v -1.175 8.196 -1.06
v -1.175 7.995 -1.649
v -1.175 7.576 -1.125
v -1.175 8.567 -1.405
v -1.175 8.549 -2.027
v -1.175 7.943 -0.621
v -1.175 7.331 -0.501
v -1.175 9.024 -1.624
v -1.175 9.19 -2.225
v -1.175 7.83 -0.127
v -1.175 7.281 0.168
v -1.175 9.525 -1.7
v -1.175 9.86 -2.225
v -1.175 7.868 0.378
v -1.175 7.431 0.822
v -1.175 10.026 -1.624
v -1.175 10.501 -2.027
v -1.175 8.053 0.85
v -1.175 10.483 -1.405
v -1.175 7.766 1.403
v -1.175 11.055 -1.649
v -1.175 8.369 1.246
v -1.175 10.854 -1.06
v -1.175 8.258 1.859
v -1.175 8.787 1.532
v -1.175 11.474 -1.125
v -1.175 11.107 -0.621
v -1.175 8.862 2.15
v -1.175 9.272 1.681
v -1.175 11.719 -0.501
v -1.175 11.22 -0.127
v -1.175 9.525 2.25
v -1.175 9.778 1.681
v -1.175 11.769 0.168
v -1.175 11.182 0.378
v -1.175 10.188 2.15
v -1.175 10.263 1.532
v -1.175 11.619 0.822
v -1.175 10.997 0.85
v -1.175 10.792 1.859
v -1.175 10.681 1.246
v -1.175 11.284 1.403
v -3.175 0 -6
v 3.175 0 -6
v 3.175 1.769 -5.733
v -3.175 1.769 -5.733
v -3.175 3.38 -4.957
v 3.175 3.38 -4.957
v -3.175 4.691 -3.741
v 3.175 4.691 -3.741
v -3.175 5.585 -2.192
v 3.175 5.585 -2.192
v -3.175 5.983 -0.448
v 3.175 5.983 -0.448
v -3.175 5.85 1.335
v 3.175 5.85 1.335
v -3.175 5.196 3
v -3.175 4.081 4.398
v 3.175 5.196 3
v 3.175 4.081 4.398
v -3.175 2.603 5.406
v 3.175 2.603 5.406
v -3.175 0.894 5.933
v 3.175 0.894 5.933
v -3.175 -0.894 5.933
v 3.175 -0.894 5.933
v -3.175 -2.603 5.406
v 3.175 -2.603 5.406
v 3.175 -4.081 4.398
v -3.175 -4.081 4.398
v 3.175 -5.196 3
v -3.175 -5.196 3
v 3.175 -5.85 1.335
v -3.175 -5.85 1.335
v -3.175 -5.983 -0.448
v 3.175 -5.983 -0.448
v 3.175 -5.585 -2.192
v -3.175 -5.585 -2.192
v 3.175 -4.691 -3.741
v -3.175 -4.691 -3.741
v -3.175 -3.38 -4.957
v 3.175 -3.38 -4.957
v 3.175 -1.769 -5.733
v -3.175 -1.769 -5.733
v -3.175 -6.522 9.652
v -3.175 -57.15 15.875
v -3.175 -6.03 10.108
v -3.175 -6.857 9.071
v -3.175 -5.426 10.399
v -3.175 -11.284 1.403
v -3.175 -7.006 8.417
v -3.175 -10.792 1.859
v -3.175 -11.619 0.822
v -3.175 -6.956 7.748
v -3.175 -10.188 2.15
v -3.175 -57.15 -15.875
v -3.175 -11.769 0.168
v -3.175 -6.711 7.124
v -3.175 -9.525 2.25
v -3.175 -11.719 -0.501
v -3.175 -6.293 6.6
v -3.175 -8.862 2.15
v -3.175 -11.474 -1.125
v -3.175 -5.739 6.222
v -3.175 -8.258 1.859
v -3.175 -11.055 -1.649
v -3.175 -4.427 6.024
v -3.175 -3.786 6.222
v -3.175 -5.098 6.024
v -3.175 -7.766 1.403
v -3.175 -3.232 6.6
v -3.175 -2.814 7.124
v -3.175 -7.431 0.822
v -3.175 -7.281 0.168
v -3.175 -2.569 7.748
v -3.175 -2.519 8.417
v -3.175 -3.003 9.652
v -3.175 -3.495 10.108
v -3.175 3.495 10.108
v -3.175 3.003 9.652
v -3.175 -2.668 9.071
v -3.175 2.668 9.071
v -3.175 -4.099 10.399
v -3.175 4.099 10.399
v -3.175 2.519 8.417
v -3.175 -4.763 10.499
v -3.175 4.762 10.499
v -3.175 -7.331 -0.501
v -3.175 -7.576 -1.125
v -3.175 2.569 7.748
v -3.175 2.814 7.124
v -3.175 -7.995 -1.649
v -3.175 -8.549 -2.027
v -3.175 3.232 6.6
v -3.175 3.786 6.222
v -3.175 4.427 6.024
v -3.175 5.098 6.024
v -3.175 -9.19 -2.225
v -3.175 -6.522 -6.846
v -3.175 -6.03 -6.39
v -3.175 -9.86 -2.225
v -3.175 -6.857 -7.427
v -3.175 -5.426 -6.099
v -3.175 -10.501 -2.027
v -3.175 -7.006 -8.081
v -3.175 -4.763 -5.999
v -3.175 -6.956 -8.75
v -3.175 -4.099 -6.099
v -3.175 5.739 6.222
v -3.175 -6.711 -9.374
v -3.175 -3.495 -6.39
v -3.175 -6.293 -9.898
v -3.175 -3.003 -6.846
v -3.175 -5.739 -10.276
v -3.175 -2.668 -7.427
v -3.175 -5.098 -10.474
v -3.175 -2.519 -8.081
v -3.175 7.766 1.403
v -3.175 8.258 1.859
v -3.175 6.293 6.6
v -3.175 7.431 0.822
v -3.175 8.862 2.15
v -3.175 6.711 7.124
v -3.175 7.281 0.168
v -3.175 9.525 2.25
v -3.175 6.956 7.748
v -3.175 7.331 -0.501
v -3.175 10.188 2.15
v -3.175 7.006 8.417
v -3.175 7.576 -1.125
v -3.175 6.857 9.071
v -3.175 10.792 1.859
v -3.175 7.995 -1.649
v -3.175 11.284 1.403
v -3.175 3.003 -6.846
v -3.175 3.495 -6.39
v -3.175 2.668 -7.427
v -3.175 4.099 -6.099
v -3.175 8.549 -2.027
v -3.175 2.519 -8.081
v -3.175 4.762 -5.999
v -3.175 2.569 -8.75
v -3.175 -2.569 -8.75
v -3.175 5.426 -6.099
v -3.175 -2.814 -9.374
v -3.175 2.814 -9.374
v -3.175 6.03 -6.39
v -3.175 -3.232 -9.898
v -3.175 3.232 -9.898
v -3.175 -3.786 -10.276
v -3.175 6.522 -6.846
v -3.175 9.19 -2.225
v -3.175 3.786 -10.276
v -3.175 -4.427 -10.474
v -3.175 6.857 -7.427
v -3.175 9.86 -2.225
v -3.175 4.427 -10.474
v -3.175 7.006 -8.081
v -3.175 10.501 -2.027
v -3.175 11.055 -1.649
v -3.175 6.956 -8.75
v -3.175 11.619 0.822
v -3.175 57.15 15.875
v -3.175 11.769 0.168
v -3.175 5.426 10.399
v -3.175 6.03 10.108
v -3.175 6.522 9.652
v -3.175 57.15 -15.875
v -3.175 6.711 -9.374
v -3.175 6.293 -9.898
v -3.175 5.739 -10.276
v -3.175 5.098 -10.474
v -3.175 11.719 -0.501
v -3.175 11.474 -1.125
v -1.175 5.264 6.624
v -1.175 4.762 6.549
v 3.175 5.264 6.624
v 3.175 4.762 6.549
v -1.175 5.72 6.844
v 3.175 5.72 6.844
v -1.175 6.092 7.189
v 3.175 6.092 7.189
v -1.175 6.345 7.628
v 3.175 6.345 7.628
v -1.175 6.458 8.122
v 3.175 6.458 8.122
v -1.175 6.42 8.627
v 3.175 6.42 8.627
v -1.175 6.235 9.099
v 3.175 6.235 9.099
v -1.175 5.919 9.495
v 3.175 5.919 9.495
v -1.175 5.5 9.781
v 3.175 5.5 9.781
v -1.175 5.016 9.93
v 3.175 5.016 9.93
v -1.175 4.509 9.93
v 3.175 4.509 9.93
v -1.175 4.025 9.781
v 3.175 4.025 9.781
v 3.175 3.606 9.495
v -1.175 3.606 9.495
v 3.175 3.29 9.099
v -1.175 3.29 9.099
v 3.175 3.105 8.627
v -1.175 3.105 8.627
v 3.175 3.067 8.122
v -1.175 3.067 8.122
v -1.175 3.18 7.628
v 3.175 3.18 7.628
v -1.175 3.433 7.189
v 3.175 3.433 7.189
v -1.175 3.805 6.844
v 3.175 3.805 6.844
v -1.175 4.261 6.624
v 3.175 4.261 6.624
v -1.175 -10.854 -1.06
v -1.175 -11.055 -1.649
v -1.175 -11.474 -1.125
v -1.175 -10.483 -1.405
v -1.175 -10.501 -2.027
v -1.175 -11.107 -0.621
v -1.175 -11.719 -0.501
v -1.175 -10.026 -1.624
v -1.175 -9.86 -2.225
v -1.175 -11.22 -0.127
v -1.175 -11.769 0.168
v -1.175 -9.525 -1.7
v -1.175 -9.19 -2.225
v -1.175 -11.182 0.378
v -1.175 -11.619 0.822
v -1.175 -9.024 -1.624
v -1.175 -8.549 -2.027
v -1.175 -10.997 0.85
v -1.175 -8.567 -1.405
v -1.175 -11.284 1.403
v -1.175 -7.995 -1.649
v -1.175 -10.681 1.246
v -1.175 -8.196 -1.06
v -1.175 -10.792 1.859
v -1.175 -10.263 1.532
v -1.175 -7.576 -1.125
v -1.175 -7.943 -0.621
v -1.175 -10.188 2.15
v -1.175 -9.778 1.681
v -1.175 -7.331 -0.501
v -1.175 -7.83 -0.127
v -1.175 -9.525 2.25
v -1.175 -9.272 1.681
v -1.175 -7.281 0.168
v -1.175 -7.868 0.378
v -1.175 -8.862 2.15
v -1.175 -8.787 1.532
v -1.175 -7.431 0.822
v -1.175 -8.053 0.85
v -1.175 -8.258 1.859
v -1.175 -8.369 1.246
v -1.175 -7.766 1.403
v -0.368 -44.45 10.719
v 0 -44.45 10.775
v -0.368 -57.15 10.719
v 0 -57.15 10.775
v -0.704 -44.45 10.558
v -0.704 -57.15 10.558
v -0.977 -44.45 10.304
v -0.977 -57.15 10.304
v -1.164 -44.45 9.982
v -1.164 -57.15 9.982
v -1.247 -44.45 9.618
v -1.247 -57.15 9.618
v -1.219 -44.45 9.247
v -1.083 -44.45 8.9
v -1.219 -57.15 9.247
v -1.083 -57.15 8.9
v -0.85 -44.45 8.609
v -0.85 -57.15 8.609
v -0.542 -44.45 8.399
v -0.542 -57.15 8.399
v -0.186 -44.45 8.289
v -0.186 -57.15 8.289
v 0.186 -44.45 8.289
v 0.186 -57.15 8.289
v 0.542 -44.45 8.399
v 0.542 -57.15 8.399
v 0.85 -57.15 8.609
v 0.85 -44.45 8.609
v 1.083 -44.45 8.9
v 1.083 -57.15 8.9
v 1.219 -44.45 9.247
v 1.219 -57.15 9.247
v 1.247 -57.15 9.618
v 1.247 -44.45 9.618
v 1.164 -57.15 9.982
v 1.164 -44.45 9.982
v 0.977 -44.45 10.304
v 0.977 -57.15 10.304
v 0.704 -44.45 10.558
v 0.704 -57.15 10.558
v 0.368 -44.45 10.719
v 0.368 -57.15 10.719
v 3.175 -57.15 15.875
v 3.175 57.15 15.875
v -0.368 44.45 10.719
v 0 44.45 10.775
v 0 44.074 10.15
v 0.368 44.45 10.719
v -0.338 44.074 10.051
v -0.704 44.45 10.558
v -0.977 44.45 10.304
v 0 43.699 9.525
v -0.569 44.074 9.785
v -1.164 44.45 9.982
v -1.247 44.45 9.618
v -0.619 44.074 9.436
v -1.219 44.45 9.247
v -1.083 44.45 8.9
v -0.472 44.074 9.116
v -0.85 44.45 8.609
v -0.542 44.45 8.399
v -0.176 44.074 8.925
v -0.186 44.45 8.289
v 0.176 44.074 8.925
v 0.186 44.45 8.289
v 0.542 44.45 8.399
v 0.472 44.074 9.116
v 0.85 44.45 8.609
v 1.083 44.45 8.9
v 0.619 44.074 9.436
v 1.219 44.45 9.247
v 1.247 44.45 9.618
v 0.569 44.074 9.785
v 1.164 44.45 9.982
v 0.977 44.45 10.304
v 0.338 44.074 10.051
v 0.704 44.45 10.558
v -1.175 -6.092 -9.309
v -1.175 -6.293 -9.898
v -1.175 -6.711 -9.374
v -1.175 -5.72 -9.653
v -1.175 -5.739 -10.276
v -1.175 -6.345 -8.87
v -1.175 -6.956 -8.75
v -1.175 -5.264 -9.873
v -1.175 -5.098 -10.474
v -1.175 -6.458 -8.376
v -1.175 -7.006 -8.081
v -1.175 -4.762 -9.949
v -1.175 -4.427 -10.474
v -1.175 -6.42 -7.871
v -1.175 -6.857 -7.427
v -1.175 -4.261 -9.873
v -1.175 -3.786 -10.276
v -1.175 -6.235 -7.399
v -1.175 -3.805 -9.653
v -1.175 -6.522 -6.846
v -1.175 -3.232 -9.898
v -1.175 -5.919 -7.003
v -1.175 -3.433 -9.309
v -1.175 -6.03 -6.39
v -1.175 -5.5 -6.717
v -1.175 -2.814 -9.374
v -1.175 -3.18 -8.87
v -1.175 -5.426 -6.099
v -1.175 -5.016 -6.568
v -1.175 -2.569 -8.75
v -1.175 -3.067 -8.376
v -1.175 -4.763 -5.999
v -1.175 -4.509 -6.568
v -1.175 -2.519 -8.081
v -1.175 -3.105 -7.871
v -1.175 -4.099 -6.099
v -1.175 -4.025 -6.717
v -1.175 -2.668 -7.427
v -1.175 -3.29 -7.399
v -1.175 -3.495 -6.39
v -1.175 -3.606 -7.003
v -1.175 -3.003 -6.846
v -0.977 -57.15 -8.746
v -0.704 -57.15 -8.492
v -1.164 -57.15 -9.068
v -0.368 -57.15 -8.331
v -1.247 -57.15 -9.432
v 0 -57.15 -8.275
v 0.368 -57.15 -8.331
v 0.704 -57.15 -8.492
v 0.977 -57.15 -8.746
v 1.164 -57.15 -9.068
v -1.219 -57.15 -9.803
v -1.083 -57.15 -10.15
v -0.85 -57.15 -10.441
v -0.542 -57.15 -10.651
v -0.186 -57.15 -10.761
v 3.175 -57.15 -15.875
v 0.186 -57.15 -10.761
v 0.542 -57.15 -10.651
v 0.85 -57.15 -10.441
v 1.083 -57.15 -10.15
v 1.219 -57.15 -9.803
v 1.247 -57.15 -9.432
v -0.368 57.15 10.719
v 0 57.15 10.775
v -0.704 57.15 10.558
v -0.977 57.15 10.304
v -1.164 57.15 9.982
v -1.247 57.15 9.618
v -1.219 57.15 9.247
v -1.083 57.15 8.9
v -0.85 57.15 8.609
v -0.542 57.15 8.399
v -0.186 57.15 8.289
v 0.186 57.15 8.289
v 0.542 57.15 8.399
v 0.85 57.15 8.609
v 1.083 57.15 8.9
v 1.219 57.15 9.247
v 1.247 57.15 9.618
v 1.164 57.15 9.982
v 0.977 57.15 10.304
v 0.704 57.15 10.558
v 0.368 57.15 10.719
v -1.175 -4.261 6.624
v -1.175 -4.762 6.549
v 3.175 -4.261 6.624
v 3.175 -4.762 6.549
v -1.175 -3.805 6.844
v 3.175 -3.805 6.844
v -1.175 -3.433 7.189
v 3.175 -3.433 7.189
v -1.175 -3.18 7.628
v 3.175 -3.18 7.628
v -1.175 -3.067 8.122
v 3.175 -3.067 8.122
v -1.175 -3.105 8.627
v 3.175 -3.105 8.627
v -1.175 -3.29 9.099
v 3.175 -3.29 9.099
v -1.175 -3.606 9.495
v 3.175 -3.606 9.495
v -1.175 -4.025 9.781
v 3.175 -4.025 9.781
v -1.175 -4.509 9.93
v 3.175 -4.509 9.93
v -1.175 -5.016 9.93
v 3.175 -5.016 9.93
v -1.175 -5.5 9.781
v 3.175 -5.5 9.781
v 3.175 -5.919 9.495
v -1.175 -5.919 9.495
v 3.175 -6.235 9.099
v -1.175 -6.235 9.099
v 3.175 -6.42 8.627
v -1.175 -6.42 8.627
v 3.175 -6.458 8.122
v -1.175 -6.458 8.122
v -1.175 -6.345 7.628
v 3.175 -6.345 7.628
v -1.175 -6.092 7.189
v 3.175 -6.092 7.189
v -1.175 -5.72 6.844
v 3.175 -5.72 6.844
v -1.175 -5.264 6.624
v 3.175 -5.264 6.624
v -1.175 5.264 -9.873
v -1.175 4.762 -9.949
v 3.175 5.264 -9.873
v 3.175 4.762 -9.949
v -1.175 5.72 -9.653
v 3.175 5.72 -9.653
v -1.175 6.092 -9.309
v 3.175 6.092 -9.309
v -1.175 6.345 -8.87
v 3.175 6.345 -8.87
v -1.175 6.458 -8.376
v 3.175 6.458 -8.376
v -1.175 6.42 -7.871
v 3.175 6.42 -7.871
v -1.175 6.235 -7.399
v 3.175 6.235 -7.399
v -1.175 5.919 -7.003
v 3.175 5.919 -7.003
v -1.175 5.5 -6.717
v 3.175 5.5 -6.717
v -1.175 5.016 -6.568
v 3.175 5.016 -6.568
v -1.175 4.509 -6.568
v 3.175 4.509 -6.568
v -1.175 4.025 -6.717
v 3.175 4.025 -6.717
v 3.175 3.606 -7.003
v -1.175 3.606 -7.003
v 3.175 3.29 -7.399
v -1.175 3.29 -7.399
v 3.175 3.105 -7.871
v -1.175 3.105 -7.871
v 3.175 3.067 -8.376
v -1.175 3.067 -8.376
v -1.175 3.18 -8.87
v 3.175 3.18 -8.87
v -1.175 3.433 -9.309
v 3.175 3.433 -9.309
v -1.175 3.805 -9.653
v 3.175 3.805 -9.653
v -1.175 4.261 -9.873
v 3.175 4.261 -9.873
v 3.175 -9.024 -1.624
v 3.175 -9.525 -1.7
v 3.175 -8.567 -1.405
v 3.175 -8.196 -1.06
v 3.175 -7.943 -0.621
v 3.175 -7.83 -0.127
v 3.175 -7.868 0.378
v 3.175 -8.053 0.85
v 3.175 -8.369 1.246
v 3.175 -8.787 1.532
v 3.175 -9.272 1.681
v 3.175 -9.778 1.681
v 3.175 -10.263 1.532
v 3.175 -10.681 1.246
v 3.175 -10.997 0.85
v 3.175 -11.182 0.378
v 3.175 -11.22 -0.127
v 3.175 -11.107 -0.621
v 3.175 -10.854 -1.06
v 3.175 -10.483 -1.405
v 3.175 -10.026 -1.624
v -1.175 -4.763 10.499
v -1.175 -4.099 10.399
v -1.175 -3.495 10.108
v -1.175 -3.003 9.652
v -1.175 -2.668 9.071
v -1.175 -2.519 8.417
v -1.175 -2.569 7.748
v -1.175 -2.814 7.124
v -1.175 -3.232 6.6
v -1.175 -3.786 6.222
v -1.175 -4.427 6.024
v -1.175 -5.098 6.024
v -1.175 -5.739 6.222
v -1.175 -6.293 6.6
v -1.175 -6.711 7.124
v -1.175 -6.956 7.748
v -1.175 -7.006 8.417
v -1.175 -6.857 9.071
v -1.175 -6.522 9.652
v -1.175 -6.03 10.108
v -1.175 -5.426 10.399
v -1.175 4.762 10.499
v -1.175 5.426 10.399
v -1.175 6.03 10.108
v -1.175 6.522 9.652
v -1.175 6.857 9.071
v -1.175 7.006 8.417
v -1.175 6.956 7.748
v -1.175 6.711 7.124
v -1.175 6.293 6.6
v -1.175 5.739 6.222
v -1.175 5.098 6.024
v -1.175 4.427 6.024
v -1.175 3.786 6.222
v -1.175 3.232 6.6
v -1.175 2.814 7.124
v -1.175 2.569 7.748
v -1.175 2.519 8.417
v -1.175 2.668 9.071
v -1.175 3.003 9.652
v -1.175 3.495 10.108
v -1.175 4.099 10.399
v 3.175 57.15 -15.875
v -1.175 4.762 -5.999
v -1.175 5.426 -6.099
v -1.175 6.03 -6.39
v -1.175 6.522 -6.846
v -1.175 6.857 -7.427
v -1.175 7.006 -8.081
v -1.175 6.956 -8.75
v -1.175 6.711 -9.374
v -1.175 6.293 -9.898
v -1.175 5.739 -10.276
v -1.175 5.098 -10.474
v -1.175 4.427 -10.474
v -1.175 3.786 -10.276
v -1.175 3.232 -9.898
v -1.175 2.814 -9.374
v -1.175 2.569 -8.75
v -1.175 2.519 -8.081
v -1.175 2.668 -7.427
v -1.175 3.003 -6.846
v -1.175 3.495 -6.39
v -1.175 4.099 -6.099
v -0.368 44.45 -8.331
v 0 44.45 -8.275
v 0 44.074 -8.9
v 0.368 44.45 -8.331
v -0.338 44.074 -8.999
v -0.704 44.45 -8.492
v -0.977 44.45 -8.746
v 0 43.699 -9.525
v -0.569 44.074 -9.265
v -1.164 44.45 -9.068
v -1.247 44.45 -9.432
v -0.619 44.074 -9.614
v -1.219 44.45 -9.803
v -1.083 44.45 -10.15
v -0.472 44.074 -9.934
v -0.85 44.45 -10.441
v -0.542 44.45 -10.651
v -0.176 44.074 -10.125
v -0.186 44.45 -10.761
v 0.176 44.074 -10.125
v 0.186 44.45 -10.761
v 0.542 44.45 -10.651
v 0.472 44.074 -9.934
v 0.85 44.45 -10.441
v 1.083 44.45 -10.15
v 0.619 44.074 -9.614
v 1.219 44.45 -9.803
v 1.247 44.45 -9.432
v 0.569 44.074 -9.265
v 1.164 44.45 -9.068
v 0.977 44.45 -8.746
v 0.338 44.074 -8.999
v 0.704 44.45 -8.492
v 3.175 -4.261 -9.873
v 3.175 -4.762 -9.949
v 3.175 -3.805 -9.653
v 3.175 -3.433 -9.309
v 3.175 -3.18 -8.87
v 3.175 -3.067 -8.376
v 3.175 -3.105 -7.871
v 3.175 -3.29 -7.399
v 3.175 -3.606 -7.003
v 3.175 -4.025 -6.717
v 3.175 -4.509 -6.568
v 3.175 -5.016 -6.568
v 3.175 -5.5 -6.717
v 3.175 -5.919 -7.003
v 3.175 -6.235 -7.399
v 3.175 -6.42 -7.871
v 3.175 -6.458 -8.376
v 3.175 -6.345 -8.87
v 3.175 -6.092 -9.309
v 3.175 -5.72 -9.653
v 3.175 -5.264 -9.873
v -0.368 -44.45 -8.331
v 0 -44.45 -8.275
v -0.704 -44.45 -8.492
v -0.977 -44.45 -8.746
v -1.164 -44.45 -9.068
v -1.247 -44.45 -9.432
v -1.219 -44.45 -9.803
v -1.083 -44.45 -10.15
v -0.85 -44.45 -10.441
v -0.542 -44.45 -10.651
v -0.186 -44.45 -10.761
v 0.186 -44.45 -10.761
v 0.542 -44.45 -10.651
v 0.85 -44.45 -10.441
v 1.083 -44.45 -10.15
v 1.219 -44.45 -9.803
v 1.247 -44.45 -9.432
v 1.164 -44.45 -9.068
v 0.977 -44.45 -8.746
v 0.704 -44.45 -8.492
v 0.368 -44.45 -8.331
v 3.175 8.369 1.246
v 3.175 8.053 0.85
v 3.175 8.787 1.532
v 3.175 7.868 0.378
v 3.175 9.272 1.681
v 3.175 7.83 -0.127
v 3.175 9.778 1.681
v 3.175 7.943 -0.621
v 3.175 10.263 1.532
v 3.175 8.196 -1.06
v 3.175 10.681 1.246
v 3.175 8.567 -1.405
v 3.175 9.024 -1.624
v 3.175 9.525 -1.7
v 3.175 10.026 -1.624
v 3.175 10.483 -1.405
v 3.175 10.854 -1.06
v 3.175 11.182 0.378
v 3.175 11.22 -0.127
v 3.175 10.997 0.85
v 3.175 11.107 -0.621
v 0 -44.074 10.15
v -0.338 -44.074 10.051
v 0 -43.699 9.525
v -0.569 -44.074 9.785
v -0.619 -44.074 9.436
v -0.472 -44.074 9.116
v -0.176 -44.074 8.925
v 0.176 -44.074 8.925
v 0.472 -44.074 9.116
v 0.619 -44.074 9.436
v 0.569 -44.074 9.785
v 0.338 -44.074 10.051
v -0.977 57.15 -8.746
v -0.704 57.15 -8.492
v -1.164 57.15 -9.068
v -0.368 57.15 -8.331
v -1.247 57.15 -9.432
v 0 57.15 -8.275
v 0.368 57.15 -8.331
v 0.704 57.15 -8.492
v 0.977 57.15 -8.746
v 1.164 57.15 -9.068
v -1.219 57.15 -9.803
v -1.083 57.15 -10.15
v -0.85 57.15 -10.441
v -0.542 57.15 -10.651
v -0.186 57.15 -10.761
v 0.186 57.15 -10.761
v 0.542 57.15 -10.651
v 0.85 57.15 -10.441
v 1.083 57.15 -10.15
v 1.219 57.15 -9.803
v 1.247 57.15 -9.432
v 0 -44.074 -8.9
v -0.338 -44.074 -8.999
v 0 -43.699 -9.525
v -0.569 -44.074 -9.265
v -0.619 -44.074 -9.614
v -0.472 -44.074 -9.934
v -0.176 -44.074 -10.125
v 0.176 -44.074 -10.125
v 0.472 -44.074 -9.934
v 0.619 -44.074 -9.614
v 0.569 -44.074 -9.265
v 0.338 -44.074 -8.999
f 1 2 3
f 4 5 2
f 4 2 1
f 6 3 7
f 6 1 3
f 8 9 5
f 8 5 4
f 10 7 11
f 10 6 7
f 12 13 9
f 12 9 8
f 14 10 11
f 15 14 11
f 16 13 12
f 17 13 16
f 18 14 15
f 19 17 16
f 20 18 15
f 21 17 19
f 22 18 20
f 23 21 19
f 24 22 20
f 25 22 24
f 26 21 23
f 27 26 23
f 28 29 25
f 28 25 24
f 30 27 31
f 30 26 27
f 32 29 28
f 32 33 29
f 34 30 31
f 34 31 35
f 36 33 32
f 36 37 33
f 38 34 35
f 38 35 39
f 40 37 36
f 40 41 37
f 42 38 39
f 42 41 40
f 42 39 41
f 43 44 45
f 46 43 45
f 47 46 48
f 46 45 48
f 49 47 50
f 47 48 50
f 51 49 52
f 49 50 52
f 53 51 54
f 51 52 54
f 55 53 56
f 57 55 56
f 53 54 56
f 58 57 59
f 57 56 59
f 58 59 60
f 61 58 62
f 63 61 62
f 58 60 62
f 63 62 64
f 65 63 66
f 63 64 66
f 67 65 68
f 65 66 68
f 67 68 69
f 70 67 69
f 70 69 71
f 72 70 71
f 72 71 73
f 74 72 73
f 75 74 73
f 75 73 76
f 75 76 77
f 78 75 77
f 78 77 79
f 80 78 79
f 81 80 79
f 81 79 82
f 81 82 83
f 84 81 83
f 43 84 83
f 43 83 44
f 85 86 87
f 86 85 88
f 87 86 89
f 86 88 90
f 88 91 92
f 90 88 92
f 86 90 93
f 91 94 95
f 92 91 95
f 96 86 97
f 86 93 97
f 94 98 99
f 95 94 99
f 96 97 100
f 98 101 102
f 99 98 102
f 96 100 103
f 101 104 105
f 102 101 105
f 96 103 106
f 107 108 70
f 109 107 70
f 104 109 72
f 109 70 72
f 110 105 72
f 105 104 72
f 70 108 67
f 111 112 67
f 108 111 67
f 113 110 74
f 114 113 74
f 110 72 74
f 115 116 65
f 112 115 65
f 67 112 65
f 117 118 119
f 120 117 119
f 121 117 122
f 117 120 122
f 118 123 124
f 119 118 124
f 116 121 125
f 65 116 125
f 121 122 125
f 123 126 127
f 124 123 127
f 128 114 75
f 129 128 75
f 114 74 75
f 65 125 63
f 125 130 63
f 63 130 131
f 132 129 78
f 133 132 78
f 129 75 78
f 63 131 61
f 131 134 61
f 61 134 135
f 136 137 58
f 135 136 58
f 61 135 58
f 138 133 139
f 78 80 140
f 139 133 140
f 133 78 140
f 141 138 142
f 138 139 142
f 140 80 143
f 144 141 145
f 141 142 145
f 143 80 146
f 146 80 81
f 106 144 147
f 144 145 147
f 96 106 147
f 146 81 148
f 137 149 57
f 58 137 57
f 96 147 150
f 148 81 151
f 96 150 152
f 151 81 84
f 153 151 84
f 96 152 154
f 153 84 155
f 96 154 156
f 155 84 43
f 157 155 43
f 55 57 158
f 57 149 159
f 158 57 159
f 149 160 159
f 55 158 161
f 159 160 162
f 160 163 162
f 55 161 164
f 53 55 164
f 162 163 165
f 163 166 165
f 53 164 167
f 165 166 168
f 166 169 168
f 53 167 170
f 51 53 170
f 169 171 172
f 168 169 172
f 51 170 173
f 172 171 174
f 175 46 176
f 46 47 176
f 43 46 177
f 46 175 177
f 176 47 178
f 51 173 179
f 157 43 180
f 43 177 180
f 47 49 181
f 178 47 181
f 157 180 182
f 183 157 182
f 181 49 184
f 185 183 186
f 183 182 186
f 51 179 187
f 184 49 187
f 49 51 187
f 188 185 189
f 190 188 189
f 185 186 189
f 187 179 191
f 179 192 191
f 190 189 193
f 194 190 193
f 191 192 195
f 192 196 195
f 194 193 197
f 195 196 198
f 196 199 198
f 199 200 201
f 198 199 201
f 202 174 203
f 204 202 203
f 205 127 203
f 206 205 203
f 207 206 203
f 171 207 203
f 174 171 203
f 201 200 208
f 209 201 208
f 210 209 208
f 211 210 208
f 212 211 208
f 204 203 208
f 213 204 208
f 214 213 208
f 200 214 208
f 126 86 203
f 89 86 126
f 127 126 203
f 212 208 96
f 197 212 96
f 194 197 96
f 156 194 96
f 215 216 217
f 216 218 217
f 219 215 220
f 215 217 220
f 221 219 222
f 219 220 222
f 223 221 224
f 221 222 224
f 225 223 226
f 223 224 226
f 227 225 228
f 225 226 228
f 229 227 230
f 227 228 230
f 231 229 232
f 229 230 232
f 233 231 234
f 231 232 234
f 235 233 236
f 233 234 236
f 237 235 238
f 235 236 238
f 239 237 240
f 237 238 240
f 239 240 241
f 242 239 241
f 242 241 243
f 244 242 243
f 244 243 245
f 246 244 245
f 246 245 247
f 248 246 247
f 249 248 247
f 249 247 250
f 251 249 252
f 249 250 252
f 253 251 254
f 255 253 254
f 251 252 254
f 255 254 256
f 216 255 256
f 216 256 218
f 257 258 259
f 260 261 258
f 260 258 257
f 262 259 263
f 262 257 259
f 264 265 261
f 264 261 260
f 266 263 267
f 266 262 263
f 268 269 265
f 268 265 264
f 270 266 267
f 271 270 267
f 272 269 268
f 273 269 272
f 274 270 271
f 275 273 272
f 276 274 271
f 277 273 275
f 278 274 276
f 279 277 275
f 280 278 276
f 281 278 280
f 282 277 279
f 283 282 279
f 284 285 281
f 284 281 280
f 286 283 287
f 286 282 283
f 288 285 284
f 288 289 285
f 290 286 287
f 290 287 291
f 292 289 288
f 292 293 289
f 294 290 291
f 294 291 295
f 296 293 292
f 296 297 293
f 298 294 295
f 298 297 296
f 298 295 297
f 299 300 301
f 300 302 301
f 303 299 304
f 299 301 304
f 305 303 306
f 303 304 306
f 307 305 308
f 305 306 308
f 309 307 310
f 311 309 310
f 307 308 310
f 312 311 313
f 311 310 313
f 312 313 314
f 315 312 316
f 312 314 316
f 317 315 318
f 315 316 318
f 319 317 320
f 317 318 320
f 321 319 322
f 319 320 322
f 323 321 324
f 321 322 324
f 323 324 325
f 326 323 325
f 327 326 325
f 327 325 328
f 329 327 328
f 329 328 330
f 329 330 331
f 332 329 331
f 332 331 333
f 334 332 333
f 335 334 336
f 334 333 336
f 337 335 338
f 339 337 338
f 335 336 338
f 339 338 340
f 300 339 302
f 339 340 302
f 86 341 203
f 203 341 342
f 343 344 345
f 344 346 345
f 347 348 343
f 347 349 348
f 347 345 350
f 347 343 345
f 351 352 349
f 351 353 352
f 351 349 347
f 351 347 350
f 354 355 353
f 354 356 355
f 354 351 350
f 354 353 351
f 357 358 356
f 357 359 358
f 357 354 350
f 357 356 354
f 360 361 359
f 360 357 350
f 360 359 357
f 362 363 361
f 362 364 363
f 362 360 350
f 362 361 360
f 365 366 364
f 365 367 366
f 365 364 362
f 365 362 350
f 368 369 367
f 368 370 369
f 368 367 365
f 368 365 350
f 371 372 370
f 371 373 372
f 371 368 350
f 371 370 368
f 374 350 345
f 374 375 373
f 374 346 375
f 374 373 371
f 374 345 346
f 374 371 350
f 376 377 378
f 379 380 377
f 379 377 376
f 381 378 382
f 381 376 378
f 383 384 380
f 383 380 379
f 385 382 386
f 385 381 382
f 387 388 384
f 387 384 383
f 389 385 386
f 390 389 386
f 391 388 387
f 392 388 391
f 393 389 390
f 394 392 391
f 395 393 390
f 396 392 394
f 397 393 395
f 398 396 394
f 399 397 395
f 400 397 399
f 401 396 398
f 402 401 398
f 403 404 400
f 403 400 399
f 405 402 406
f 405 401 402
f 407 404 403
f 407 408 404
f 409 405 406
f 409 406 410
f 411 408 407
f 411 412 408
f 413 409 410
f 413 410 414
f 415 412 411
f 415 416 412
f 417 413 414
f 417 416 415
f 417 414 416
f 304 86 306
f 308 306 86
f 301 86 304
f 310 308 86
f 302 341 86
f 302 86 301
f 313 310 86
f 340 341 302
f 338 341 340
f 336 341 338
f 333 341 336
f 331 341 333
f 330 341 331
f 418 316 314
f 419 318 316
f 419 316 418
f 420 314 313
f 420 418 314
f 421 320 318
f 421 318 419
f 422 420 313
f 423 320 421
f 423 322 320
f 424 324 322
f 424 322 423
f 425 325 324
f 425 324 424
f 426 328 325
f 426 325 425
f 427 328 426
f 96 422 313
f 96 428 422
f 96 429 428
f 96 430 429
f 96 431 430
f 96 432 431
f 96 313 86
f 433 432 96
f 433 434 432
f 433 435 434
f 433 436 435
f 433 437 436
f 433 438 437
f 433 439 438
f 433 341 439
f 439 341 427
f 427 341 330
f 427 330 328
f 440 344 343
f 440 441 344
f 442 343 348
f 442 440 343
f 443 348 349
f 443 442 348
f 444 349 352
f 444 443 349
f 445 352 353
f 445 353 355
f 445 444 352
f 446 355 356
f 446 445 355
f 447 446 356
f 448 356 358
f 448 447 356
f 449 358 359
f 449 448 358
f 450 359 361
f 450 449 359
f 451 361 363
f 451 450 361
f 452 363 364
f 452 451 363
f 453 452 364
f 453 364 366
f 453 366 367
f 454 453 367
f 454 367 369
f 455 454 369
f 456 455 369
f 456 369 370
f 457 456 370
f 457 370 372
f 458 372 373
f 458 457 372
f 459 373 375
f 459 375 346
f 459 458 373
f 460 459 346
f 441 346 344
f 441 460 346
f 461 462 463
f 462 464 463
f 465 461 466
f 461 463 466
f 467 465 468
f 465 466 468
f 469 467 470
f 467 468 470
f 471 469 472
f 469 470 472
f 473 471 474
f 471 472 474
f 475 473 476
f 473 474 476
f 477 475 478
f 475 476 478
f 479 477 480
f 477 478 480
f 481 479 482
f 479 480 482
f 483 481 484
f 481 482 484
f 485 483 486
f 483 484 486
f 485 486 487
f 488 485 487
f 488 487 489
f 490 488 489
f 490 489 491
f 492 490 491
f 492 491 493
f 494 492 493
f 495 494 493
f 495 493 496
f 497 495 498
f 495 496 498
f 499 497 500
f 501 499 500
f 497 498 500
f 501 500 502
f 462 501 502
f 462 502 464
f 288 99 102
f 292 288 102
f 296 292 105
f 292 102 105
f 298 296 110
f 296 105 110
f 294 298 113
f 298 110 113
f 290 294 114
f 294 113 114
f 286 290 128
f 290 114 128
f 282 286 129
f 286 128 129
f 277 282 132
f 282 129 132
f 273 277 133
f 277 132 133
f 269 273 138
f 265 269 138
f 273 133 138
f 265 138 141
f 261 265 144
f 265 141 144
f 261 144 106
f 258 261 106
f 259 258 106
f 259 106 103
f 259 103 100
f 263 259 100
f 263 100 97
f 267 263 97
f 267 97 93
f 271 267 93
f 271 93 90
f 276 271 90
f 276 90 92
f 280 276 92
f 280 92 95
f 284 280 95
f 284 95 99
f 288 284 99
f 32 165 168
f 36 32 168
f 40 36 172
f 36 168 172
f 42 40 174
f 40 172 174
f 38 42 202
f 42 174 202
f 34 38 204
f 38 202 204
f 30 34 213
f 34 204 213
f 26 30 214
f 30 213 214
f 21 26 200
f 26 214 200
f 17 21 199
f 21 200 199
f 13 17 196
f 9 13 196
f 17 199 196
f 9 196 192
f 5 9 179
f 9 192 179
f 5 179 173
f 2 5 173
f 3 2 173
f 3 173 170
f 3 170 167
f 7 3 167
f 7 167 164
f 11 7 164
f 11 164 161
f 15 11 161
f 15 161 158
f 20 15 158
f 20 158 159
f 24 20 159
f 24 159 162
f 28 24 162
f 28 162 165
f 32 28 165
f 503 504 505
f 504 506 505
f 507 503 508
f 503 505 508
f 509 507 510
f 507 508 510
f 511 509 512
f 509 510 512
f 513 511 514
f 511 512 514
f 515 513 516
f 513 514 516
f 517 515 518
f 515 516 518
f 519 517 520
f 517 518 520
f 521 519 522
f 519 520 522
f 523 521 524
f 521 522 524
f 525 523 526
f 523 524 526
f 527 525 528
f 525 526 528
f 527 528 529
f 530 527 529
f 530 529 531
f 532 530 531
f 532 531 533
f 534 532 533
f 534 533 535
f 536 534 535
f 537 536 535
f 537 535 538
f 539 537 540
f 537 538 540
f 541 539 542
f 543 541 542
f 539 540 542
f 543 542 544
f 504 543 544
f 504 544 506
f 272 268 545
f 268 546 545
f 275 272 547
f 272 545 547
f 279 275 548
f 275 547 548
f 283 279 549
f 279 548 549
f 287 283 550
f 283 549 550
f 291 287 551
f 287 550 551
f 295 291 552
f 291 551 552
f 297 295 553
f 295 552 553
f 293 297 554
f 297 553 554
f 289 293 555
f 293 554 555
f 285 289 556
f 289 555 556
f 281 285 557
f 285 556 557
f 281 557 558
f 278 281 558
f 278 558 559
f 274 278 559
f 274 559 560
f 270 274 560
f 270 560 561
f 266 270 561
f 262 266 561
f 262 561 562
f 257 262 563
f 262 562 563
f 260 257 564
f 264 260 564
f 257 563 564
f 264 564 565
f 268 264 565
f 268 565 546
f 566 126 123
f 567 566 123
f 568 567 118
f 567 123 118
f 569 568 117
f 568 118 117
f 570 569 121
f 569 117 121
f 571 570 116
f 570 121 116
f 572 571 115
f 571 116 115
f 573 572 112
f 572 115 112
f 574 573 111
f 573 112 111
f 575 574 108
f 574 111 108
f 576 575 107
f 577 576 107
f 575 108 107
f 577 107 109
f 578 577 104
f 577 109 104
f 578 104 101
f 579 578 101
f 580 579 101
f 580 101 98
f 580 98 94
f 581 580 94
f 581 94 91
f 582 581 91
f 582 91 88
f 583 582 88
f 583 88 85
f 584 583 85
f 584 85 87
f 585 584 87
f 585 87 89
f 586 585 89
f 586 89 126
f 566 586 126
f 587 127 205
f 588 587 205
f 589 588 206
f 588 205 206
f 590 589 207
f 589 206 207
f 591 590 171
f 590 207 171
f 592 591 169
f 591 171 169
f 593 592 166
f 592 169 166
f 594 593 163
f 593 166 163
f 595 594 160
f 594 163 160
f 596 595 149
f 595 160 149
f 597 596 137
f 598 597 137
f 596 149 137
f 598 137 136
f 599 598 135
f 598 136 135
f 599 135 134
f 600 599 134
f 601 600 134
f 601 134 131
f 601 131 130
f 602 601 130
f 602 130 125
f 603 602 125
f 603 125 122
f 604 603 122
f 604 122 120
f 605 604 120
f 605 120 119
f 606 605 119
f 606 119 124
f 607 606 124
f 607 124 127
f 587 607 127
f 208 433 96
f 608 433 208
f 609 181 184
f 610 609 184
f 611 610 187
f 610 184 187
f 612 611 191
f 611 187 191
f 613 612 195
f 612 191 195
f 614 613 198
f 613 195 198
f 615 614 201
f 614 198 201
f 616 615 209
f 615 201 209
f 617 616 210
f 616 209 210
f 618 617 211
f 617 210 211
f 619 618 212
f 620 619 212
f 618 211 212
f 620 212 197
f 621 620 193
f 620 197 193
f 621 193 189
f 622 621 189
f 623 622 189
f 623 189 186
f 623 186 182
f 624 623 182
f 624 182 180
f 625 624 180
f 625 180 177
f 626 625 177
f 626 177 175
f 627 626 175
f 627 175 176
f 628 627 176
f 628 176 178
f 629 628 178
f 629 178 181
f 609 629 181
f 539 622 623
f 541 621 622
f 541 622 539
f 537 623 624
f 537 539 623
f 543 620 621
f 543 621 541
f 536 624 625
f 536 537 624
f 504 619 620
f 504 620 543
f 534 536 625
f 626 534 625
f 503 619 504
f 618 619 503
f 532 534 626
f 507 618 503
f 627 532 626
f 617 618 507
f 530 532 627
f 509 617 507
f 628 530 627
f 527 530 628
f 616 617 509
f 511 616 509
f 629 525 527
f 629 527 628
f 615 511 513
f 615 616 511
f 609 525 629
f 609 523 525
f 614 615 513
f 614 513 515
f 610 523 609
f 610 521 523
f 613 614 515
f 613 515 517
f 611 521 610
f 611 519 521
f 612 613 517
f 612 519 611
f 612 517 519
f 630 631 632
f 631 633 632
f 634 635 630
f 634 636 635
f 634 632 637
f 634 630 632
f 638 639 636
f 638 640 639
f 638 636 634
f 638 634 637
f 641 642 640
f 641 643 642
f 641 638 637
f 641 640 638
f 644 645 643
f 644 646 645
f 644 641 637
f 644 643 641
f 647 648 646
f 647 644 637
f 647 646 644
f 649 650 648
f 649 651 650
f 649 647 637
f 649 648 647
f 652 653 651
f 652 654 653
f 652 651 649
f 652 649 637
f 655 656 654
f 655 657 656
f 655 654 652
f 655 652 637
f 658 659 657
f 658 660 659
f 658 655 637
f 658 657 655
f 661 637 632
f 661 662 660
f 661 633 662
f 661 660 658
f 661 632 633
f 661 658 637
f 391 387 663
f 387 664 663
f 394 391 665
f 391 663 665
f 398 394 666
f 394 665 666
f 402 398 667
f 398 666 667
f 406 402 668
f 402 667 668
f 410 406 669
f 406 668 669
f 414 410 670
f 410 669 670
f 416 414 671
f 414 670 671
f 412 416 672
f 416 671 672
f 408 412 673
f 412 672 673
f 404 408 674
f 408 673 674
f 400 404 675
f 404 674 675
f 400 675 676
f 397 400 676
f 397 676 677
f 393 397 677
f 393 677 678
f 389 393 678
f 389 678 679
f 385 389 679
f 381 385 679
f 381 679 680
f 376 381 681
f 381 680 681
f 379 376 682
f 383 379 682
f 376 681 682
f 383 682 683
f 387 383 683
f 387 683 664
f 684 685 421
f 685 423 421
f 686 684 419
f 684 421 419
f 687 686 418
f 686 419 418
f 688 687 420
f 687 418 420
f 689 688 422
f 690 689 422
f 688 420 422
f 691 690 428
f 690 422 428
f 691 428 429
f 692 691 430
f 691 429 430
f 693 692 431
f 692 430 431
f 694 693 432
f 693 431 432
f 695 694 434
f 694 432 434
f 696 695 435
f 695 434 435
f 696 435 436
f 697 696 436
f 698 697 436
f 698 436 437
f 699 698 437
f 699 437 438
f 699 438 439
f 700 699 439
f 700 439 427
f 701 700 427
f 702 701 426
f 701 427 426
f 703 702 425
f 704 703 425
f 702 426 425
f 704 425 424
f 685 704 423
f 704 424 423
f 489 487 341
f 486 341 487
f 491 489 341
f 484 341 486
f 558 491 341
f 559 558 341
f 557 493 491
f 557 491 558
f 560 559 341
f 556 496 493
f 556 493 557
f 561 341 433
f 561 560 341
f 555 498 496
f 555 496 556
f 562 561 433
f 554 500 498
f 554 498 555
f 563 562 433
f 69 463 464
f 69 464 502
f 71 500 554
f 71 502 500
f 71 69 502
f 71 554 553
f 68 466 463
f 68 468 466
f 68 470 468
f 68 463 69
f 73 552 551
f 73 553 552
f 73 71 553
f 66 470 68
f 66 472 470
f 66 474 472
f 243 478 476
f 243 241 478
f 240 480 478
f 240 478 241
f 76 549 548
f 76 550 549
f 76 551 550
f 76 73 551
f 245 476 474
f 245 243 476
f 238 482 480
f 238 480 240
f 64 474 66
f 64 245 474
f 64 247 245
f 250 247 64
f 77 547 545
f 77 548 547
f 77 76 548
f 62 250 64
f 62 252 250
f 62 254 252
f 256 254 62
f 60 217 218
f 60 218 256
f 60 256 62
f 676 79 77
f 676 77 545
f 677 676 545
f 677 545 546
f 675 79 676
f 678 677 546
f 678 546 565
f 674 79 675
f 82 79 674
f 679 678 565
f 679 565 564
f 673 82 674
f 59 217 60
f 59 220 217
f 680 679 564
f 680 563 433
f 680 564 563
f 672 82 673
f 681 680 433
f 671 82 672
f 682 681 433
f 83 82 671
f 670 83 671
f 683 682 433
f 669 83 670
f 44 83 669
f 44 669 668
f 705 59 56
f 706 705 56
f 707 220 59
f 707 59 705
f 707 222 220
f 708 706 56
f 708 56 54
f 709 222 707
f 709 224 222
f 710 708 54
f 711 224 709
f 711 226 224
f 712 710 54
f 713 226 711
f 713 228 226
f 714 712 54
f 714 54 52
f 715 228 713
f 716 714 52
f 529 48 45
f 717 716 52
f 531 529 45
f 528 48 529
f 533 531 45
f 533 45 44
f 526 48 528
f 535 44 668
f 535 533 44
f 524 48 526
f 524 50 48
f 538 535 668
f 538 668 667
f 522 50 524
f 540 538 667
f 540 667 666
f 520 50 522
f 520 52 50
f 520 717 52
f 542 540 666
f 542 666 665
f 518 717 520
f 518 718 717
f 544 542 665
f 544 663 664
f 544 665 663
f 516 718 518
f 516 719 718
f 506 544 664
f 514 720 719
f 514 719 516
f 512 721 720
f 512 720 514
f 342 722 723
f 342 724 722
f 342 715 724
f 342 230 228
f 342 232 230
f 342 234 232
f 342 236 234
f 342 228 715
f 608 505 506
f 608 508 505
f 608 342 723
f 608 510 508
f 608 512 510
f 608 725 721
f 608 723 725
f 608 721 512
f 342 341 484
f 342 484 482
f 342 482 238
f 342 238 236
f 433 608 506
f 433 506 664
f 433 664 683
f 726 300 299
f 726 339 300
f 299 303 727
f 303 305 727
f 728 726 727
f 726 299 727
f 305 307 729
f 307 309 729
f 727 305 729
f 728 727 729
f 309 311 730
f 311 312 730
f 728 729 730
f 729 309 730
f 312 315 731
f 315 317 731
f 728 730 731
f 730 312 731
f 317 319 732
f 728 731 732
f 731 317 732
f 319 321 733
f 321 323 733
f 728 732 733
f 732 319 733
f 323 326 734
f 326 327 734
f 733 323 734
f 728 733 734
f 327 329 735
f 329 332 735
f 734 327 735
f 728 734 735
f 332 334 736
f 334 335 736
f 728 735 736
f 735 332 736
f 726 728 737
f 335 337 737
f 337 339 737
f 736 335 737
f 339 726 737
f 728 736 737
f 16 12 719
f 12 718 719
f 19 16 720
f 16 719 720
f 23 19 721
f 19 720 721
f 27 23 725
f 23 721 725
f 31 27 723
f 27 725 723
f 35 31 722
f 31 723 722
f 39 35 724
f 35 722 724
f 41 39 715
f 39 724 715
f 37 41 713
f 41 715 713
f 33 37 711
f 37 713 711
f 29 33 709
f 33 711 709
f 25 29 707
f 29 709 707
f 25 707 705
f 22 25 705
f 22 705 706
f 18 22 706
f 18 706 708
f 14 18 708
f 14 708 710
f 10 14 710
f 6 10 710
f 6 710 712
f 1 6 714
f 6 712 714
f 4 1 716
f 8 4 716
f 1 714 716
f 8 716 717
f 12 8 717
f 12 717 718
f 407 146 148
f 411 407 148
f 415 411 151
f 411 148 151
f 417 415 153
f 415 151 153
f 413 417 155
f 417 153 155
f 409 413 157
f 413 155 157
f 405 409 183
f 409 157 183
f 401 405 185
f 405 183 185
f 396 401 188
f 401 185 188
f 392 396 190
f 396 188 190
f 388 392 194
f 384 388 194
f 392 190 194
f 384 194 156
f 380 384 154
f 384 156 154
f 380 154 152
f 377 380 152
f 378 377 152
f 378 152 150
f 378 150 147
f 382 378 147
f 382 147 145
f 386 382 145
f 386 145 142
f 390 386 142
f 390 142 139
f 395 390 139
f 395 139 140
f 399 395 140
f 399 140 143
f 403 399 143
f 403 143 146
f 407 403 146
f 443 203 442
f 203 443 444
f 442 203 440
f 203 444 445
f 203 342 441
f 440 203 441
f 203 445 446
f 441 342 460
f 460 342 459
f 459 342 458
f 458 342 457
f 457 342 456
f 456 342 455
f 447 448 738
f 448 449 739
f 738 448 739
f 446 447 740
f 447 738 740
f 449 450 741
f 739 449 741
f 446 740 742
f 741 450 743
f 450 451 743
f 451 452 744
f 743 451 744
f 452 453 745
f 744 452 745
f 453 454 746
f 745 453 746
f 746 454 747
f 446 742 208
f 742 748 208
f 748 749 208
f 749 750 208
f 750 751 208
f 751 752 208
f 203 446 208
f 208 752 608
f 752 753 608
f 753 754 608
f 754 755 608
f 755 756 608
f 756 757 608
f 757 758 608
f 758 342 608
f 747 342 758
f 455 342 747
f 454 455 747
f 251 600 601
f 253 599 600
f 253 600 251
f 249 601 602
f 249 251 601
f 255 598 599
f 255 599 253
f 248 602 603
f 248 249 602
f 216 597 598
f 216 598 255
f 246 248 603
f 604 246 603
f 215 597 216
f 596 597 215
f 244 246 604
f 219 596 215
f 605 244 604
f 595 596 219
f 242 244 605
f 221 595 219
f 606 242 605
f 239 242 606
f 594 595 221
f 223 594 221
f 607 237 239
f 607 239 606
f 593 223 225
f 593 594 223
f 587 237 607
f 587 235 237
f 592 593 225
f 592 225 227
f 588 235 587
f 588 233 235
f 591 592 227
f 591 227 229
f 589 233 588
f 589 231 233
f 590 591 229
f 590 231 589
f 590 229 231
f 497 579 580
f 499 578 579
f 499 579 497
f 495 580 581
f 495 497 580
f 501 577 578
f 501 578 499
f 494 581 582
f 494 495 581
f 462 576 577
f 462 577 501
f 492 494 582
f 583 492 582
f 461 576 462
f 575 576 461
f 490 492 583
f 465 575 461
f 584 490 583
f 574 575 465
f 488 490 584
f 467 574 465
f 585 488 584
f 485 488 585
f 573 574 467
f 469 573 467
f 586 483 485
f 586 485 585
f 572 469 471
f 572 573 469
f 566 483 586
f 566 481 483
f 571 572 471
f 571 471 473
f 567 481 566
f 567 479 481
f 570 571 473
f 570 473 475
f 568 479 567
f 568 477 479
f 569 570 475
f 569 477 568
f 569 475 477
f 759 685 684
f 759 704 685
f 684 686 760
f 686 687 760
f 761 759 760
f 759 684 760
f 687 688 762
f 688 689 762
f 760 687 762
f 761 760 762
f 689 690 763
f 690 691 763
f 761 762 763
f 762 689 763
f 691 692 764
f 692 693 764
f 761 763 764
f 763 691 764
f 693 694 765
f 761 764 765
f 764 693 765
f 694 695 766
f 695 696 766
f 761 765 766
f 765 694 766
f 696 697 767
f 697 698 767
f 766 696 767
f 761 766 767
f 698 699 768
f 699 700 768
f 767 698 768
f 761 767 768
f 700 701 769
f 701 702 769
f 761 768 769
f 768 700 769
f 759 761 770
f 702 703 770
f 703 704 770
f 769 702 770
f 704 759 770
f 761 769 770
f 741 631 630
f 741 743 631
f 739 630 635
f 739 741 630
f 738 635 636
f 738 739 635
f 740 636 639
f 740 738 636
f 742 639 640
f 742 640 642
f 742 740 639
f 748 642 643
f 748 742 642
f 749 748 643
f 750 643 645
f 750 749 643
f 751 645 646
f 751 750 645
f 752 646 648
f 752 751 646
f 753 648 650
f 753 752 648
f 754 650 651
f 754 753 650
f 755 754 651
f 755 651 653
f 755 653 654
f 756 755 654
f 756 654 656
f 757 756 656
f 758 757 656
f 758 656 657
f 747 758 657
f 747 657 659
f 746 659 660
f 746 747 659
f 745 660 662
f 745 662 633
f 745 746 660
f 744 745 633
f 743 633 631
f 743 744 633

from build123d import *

# Parameters (mm, degrees)
SKETCH1_W                      = 31.75
SKETCH1_H                      = 114.3
BOSS_EXTRUDE1_DEPTH            = 3.175
M3X0_5_TAPPED_HOLE1_AT_2_COUNT = 2
M3X0_5_TAPPED_HOLE1_AT_2_PITCH = 19.05
F_12_0MM_DOWEL_HOLE1_D         = 12
CBORE_FOR_M3_SHCS1_D           = 3.4
CBORE_FOR_M3_SHCS1_DEPTH       = 11.678536948
CBORE_FOR_M3_SHCS1_CBORE_D     = 4.5
CBORE_FOR_M3_SHCS1_CBORE_DEPTH = 2
CBORE_FOR_M3_SHCS1_TIP         = 1.021463052


with BuildPart() as part:
    # Sketch1 → Boss-Extrude1 (new, symmetric)
    with BuildSketch(Plane(origin=(0, 0, 0), x_dir=(0, 0, -1), z_dir=(1, 0, 0))):
        Rectangle(SKETCH1_W, SKETCH1_H)
    extrude(amount=BOSS_EXTRUDE1_DEPTH, both=True)

    # Sketch5 → M3x0.5 Tapped Hole1 (revolve, cut)
    with BuildSketch(Plane(origin=(0, 57.15, -9.525), x_dir=(0, 0, 1), z_dir=(1, 0, 0))):
        Polygon((0, 0), (0, 13.451075774), (1.25, 12.7), (1.25, 0), align=None)
    m3x0_5_tapped_hole1 = revolve(axis=Axis((0, 63.5, -9.525), (0, -1, 0)), mode=Mode.SUBTRACT)

    # M3x0.5 Tapped Hole1 at 2: M3x0.5 Tapped Hole1 ×2
    with Locations(*[(0, 0, i * M3X0_5_TAPPED_HOLE1_AT_2_PITCH) for i in range(1, M3X0_5_TAPPED_HOLE1_AT_2_COUNT)]):
        add(m3x0_5_tapped_hole1, mode=Mode.SUBTRACT)

    # Mirror1: M3x0.5 Tapped Hole1 across plane
    add(m3x0_5_tapped_hole1.mirror(Plane.ZX), mode=Mode.SUBTRACT)

    # Mirror1 copy 1 sketch → Mirror1 copy 1 (revolve, cut)
    with BuildSketch(Plane(origin=(0, -57.15, 9.525), x_dir=(0, 0, 1), z_dir=(1, 0, 0))):
        Polygon((0, 0), (0, -13.451075774), (1.25, -12.7), (1.25, 0), align=None)
    revolve(axis=Axis((0, -63.5, 9.525), (0, -1, 0)), mode=Mode.SUBTRACT)

    # Ø12.0mm Dowel Hole1 (through all)
    with Locations(Plane.ZY.offset(3.175)):
        with Locations((0, 0)):
            Hole(F_12_0MM_DOWEL_HOLE1_D / 2)

    # CBORE for M3 SHCS1
    with Locations(Plane.ZY.offset(3.175)):
        with Locations((8.248891971, -4.7625), (8.248891971, 4.7625), (0, 9.525), (-8.248891971, 4.7625), (-8.248891971, -4.7625), (0, -9.525)):
            CounterBoreHole(CBORE_FOR_M3_SHCS1_D / 2, CBORE_FOR_M3_SHCS1_CBORE_D / 2, CBORE_FOR_M3_SHCS1_CBORE_DEPTH, depth=CBORE_FOR_M3_SHCS1_DEPTH)
            with Locations((0, 0, -(CBORE_FOR_M3_SHCS1_DEPTH + CBORE_FOR_M3_SHCS1_TIP / 2))):  # 118° drill point
                Cone(0, CBORE_FOR_M3_SHCS1_D / 2, CBORE_FOR_M3_SHCS1_TIP, mode=Mode.SUBTRACT)


solid = part.part
